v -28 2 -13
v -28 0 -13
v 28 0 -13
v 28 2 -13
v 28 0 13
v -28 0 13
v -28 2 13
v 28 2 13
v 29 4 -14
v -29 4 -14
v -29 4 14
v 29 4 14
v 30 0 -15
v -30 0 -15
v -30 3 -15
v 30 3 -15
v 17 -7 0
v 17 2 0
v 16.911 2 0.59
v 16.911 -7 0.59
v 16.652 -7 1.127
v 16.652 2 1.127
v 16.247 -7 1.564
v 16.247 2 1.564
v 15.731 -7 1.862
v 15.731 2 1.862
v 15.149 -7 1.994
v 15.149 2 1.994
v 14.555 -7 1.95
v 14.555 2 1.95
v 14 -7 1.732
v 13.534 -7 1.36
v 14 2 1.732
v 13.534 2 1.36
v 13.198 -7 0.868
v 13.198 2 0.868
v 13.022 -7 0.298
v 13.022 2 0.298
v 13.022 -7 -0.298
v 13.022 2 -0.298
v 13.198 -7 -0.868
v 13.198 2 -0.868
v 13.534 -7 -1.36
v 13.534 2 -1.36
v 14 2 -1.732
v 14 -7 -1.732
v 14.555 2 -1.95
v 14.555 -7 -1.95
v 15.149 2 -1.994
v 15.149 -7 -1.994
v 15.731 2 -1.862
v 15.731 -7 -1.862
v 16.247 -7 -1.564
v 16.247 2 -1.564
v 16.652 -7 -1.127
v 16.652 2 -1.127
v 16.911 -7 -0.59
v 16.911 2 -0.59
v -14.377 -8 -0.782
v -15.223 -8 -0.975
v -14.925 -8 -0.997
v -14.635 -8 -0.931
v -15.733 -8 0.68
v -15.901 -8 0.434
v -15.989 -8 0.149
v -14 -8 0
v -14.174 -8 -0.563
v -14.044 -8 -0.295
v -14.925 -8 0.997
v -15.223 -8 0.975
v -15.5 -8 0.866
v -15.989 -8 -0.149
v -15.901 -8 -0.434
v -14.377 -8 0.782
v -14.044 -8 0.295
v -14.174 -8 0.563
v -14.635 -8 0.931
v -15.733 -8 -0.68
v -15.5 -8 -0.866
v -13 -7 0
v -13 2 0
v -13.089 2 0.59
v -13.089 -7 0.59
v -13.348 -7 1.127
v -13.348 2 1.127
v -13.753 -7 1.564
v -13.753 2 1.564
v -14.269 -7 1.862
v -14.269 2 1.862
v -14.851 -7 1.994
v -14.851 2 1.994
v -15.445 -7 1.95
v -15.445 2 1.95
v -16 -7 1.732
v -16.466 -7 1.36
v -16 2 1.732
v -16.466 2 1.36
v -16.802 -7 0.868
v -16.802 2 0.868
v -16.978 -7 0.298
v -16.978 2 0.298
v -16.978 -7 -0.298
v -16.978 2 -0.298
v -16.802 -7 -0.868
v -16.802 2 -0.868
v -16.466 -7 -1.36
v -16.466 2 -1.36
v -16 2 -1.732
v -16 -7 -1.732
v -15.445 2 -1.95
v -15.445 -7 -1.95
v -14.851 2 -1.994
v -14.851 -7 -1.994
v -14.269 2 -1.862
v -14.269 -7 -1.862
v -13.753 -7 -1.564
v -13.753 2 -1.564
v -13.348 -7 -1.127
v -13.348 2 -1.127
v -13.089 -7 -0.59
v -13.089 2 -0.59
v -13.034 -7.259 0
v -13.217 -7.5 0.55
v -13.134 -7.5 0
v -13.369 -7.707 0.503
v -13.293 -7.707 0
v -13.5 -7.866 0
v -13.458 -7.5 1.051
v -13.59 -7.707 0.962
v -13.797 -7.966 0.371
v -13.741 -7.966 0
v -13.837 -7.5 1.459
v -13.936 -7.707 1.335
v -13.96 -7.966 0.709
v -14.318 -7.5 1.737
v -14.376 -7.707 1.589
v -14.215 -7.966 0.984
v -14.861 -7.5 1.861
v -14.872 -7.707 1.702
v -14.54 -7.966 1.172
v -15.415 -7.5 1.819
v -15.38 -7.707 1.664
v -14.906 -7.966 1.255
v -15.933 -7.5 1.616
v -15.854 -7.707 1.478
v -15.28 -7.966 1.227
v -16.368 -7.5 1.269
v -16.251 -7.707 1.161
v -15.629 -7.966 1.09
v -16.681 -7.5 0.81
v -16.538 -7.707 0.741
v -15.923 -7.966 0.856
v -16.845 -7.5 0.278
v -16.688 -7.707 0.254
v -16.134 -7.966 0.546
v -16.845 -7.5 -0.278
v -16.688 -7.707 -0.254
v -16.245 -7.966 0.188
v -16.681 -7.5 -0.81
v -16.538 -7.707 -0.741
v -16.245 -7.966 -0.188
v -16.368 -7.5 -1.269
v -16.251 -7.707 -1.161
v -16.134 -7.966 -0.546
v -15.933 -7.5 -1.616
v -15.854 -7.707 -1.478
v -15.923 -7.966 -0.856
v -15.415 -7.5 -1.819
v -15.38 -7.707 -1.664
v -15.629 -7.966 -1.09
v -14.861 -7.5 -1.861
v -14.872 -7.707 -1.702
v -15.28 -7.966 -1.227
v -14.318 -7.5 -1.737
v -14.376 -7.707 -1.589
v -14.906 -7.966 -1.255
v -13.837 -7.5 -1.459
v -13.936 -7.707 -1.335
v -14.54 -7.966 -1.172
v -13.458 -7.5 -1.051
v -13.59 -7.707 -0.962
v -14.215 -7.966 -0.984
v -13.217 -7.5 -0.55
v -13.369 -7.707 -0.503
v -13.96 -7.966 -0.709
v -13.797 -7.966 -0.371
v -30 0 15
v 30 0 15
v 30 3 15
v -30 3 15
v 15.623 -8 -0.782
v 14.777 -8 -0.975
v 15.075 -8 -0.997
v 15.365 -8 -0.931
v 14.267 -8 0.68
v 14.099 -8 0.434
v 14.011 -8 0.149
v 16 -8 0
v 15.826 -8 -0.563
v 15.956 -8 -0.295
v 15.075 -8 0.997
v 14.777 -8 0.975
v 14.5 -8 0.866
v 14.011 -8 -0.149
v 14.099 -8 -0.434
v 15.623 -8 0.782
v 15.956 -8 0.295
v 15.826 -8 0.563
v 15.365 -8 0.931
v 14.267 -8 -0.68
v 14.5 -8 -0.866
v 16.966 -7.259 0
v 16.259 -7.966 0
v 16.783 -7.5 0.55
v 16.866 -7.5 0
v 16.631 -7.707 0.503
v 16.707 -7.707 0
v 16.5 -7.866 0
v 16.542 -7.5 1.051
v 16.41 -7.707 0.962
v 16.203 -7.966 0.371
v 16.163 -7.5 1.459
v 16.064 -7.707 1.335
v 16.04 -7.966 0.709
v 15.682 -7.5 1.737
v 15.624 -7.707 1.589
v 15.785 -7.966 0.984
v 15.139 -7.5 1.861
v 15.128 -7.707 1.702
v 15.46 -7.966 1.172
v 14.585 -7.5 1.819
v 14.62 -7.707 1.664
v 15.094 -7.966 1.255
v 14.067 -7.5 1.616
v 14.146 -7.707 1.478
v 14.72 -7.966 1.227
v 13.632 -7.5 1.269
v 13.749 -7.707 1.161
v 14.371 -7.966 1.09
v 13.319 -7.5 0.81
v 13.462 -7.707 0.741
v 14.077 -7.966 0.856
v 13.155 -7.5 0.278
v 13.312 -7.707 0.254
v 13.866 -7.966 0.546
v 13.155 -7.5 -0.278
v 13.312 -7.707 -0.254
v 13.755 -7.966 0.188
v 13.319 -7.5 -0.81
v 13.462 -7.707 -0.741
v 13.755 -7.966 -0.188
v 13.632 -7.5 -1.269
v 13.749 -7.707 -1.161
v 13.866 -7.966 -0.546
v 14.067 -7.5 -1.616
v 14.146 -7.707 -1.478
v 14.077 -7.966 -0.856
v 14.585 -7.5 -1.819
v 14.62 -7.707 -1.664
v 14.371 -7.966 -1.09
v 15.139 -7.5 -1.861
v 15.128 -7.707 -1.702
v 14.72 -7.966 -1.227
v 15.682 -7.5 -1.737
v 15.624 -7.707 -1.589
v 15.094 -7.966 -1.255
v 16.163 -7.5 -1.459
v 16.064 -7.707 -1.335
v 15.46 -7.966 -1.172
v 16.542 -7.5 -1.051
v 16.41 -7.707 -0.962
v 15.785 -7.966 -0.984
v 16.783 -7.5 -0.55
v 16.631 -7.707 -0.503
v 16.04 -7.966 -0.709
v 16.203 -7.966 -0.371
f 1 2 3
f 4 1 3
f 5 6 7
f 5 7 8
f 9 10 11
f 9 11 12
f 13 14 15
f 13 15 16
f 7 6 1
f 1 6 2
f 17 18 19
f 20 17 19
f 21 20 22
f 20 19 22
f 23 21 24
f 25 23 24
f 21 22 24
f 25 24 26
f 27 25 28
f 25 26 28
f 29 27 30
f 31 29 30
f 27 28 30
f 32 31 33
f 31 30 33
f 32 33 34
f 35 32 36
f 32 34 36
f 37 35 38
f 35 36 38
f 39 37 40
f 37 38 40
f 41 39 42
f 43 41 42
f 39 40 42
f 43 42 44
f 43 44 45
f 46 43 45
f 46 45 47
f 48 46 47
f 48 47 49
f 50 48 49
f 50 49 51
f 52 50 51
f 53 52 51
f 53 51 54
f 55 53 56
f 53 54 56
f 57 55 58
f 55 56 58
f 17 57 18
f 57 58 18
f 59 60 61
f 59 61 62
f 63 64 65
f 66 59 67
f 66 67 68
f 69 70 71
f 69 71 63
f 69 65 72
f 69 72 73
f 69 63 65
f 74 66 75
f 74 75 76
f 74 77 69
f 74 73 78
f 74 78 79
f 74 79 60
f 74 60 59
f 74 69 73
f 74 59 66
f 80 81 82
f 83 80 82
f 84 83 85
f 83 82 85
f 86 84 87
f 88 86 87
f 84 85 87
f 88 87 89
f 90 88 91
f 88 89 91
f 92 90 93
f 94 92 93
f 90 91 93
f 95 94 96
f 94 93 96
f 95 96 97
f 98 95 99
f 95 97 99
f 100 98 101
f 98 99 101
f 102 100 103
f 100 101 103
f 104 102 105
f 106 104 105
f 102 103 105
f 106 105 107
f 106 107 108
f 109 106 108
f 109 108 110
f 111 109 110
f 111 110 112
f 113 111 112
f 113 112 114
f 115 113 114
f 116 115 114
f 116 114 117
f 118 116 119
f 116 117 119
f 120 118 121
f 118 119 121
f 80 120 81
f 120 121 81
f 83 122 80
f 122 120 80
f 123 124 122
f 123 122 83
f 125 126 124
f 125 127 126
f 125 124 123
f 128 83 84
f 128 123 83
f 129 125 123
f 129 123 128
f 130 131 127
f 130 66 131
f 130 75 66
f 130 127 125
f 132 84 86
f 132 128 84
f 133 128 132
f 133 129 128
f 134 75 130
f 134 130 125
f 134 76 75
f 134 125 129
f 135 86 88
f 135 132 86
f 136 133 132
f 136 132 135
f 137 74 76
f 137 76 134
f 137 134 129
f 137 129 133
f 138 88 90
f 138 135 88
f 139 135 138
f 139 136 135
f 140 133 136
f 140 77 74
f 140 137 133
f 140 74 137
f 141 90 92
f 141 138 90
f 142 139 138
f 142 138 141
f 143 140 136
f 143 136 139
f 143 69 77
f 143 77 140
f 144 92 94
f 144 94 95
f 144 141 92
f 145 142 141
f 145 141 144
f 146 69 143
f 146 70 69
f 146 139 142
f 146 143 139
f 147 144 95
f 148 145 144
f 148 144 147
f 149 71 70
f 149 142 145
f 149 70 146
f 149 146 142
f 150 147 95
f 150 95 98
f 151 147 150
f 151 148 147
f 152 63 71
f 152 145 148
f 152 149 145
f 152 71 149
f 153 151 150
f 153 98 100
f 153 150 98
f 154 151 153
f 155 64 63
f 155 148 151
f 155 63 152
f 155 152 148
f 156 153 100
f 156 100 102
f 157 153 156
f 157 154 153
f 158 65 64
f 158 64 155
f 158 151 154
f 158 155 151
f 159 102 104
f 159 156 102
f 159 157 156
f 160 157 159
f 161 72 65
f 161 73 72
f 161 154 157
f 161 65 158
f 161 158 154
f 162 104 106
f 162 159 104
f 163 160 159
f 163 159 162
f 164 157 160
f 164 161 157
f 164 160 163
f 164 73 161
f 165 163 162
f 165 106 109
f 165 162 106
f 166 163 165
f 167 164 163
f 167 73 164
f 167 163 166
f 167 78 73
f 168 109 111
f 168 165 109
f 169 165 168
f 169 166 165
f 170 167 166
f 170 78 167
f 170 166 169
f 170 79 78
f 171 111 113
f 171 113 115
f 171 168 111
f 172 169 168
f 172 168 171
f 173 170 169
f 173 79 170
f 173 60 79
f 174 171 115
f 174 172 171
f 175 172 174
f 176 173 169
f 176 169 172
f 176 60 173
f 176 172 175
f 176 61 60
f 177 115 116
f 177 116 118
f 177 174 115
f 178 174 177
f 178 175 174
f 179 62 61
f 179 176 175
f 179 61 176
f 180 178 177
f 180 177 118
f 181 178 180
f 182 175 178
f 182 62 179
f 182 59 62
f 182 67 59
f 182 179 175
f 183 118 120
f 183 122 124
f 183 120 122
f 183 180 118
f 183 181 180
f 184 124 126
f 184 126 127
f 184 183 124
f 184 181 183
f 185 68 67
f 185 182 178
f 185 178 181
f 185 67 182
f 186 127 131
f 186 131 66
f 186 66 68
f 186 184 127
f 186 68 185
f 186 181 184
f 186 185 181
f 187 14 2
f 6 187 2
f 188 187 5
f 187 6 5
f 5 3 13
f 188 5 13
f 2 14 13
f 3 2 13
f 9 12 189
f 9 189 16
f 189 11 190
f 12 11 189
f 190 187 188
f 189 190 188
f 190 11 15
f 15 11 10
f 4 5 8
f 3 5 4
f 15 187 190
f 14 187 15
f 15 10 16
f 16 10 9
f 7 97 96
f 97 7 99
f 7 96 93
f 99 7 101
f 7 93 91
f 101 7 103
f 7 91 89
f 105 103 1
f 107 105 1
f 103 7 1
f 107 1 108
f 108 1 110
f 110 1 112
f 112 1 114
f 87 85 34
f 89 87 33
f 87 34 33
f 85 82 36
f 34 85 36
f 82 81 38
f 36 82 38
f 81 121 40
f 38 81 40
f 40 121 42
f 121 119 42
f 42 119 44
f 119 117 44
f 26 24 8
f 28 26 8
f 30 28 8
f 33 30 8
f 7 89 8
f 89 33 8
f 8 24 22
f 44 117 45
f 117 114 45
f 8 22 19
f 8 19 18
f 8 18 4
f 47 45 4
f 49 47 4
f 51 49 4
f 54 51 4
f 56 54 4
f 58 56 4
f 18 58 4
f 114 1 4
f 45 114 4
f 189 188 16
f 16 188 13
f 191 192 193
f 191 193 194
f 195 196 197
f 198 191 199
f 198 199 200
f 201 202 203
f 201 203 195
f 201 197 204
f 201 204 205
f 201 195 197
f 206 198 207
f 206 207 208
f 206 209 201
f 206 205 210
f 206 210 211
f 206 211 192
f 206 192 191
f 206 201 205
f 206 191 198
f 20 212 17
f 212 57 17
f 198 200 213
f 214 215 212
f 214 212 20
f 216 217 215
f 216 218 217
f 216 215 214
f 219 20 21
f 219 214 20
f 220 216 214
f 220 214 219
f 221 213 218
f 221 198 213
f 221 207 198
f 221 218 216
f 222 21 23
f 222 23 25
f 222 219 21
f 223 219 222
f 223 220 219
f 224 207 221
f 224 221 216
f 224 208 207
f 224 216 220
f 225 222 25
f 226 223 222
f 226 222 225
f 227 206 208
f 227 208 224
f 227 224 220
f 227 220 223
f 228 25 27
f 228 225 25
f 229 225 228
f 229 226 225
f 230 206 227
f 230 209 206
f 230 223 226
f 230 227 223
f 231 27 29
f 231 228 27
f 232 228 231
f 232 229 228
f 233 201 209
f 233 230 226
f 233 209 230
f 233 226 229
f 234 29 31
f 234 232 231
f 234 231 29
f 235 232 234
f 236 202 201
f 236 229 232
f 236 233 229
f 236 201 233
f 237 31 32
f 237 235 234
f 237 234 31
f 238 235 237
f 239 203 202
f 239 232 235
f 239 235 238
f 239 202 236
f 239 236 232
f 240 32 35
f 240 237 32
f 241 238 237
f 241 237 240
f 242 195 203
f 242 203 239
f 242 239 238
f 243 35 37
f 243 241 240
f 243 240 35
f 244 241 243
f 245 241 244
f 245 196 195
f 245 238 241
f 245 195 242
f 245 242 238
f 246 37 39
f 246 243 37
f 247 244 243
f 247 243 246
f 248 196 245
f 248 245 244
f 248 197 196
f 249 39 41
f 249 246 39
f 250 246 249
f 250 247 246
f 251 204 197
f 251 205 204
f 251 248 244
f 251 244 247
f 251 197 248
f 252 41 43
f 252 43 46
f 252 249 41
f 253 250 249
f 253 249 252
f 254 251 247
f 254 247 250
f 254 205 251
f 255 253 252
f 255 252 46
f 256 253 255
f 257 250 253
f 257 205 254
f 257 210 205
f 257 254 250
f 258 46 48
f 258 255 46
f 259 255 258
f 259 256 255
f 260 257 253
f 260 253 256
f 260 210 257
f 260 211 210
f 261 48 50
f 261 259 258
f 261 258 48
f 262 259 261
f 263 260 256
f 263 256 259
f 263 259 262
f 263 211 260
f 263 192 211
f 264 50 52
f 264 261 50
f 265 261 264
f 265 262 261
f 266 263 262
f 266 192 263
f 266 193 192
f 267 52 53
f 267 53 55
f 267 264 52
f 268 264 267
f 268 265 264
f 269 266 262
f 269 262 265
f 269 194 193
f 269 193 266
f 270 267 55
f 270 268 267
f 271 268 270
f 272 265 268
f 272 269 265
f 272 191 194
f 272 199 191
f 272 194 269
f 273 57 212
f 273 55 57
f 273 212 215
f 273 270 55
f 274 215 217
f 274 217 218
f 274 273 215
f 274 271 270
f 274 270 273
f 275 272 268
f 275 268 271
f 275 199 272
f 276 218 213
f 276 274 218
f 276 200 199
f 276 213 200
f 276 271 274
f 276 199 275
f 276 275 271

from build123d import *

# Parameters (mm, degrees)
SKETCH1_W           = 60
SKETCH1_H           = 30
BOSS_EXTRUDE1_DEPTH = 4
SHELL1_T            = -2
SKETCH2_R           = 2
BOSS_EXTRUDE2_DEPTH = 10
FILLET1_R           = 1
CHAMFER1_SIZE       = 1


with BuildPart() as part:
    # Sketch1 → Boss-Extrude1 (new body)
    with BuildSketch(Plane(origin=(0, 0, 0), x_dir=(1, 0, 0), z_dir=(0, 1, 0))):
        Rectangle(SKETCH1_W, SKETCH1_H)
    extrude(amount=BOSS_EXTRUDE1_DEPTH)

    # Shell1
    shell1_openings = [part.faces().sort_by_distance(p)[0] for p in [
        (0, 0, 0),
    ]]
    offset(amount=SHELL1_T, openings=shell1_openings, kind=Kind.INTERSECTION)

    # Sketch2 → Boss-Extrude2 (add)
    with BuildSketch(Plane.XZ.offset(-2)):
        with Locations((-15, 0)):
            Circle(SKETCH2_R)
        with Locations((15, 0)):
            Circle(SKETCH2_R)
    extrude(amount=BOSS_EXTRUDE2_DEPTH)

    # Fillet1
    fillet1_edges = [part.edges().sort_by_distance(p)[0] for p in [
        (-17, -8, 0),
        (13, -8, 0),
    ]]
    fillet(fillet1_edges, radius=FILLET1_R)

    # Chamfer1
    chamfer1_edges = [part.edges().sort_by_distance(p)[0] for p in [
        (-30, 4, 0),
        (0, 4, 15),
        (30, 4, 0),
        (0, 4, -15),
    ]]
    chamfer(chamfer1_edges, length=CHAMFER1_SIZE)


solid = part.part
